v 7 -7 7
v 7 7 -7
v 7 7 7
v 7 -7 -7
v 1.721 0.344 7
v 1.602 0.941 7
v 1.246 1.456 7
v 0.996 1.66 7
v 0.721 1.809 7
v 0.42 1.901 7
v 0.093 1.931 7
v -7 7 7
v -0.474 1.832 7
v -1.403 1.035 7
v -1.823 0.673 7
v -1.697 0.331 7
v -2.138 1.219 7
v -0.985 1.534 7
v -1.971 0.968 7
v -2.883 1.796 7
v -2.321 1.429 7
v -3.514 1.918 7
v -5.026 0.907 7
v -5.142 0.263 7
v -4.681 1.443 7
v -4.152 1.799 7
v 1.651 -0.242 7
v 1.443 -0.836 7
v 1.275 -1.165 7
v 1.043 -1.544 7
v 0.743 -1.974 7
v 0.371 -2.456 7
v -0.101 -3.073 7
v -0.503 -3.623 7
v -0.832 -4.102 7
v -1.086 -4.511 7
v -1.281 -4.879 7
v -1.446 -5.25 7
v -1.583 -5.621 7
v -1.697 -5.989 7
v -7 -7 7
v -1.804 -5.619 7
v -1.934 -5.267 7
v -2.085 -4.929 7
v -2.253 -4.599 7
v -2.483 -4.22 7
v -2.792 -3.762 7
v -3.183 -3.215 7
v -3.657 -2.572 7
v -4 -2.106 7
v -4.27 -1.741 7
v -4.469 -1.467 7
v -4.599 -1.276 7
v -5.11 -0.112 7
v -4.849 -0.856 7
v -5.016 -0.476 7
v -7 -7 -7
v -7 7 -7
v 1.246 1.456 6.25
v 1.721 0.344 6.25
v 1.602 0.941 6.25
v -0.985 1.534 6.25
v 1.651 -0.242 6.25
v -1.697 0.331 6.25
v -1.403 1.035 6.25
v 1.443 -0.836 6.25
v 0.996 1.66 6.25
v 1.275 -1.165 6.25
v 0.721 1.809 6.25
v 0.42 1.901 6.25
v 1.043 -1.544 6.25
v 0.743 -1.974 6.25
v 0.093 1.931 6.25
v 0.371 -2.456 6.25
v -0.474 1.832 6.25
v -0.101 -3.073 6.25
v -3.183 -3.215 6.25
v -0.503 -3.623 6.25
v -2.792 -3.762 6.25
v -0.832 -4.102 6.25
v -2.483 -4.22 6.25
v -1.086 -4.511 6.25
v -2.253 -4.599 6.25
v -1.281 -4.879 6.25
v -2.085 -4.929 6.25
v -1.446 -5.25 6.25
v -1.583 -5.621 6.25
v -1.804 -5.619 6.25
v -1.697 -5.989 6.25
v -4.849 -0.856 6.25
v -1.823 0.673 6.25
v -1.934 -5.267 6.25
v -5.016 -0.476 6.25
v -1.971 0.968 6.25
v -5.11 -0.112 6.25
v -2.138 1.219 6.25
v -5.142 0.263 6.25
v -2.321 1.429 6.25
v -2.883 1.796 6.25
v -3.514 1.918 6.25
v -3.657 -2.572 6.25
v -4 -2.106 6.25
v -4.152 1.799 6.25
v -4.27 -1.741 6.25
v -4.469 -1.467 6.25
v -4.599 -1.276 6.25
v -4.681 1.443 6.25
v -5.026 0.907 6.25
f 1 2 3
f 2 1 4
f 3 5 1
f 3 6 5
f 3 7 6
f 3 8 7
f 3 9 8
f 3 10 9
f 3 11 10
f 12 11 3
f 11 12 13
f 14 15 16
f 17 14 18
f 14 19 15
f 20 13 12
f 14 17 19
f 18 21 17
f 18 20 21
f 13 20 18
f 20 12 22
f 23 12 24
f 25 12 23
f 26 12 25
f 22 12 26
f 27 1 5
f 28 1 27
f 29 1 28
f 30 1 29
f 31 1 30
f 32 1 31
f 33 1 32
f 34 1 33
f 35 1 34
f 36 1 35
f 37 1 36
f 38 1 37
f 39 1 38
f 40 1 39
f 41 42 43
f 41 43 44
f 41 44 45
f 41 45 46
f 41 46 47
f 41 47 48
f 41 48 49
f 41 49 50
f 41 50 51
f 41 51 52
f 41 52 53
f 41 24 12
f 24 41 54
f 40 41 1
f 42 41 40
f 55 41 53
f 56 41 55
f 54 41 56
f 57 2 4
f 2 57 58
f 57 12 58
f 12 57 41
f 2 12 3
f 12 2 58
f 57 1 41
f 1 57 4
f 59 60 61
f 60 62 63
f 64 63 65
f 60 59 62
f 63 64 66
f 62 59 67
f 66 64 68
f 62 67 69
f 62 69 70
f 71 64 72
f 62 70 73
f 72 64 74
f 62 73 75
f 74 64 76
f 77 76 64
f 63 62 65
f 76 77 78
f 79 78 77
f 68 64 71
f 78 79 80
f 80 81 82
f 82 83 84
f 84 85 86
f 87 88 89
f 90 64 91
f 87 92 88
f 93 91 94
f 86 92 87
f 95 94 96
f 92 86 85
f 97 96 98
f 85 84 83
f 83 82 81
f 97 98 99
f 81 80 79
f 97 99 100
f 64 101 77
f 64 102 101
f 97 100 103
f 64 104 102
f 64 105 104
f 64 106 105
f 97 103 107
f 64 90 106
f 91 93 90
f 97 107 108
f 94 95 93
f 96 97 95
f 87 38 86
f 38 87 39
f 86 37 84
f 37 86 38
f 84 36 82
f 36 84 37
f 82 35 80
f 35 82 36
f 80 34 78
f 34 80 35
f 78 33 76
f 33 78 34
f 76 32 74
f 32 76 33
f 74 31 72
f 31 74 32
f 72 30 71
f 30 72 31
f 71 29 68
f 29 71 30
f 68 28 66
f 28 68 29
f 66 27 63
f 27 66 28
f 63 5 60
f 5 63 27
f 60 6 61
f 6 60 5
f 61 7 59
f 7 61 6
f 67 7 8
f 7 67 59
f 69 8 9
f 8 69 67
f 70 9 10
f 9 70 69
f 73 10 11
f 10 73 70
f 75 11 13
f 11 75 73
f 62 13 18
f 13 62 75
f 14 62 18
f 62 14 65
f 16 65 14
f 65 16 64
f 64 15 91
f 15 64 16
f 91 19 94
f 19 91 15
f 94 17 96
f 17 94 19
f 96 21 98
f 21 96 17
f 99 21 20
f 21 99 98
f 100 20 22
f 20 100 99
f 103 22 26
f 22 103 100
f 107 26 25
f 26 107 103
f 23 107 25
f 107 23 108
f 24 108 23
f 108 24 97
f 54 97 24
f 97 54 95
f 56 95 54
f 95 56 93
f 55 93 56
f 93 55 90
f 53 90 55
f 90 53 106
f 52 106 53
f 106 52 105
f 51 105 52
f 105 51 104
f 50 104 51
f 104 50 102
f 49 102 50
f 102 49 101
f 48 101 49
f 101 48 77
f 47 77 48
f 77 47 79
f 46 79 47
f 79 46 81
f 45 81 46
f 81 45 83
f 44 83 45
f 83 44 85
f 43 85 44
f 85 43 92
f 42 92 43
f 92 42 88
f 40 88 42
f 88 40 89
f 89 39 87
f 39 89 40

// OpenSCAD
$fn=12;

// unit is mm

side = 14;
depth = 3;

s = side / 2.4;


difference() {

  cube([ side, side, side ], center=true);

  translate([ -s, -s, side / 2 - depth / 4 ])
    linear_extrude(1.1 * depth)
      text("\u2665", size=10);
}
